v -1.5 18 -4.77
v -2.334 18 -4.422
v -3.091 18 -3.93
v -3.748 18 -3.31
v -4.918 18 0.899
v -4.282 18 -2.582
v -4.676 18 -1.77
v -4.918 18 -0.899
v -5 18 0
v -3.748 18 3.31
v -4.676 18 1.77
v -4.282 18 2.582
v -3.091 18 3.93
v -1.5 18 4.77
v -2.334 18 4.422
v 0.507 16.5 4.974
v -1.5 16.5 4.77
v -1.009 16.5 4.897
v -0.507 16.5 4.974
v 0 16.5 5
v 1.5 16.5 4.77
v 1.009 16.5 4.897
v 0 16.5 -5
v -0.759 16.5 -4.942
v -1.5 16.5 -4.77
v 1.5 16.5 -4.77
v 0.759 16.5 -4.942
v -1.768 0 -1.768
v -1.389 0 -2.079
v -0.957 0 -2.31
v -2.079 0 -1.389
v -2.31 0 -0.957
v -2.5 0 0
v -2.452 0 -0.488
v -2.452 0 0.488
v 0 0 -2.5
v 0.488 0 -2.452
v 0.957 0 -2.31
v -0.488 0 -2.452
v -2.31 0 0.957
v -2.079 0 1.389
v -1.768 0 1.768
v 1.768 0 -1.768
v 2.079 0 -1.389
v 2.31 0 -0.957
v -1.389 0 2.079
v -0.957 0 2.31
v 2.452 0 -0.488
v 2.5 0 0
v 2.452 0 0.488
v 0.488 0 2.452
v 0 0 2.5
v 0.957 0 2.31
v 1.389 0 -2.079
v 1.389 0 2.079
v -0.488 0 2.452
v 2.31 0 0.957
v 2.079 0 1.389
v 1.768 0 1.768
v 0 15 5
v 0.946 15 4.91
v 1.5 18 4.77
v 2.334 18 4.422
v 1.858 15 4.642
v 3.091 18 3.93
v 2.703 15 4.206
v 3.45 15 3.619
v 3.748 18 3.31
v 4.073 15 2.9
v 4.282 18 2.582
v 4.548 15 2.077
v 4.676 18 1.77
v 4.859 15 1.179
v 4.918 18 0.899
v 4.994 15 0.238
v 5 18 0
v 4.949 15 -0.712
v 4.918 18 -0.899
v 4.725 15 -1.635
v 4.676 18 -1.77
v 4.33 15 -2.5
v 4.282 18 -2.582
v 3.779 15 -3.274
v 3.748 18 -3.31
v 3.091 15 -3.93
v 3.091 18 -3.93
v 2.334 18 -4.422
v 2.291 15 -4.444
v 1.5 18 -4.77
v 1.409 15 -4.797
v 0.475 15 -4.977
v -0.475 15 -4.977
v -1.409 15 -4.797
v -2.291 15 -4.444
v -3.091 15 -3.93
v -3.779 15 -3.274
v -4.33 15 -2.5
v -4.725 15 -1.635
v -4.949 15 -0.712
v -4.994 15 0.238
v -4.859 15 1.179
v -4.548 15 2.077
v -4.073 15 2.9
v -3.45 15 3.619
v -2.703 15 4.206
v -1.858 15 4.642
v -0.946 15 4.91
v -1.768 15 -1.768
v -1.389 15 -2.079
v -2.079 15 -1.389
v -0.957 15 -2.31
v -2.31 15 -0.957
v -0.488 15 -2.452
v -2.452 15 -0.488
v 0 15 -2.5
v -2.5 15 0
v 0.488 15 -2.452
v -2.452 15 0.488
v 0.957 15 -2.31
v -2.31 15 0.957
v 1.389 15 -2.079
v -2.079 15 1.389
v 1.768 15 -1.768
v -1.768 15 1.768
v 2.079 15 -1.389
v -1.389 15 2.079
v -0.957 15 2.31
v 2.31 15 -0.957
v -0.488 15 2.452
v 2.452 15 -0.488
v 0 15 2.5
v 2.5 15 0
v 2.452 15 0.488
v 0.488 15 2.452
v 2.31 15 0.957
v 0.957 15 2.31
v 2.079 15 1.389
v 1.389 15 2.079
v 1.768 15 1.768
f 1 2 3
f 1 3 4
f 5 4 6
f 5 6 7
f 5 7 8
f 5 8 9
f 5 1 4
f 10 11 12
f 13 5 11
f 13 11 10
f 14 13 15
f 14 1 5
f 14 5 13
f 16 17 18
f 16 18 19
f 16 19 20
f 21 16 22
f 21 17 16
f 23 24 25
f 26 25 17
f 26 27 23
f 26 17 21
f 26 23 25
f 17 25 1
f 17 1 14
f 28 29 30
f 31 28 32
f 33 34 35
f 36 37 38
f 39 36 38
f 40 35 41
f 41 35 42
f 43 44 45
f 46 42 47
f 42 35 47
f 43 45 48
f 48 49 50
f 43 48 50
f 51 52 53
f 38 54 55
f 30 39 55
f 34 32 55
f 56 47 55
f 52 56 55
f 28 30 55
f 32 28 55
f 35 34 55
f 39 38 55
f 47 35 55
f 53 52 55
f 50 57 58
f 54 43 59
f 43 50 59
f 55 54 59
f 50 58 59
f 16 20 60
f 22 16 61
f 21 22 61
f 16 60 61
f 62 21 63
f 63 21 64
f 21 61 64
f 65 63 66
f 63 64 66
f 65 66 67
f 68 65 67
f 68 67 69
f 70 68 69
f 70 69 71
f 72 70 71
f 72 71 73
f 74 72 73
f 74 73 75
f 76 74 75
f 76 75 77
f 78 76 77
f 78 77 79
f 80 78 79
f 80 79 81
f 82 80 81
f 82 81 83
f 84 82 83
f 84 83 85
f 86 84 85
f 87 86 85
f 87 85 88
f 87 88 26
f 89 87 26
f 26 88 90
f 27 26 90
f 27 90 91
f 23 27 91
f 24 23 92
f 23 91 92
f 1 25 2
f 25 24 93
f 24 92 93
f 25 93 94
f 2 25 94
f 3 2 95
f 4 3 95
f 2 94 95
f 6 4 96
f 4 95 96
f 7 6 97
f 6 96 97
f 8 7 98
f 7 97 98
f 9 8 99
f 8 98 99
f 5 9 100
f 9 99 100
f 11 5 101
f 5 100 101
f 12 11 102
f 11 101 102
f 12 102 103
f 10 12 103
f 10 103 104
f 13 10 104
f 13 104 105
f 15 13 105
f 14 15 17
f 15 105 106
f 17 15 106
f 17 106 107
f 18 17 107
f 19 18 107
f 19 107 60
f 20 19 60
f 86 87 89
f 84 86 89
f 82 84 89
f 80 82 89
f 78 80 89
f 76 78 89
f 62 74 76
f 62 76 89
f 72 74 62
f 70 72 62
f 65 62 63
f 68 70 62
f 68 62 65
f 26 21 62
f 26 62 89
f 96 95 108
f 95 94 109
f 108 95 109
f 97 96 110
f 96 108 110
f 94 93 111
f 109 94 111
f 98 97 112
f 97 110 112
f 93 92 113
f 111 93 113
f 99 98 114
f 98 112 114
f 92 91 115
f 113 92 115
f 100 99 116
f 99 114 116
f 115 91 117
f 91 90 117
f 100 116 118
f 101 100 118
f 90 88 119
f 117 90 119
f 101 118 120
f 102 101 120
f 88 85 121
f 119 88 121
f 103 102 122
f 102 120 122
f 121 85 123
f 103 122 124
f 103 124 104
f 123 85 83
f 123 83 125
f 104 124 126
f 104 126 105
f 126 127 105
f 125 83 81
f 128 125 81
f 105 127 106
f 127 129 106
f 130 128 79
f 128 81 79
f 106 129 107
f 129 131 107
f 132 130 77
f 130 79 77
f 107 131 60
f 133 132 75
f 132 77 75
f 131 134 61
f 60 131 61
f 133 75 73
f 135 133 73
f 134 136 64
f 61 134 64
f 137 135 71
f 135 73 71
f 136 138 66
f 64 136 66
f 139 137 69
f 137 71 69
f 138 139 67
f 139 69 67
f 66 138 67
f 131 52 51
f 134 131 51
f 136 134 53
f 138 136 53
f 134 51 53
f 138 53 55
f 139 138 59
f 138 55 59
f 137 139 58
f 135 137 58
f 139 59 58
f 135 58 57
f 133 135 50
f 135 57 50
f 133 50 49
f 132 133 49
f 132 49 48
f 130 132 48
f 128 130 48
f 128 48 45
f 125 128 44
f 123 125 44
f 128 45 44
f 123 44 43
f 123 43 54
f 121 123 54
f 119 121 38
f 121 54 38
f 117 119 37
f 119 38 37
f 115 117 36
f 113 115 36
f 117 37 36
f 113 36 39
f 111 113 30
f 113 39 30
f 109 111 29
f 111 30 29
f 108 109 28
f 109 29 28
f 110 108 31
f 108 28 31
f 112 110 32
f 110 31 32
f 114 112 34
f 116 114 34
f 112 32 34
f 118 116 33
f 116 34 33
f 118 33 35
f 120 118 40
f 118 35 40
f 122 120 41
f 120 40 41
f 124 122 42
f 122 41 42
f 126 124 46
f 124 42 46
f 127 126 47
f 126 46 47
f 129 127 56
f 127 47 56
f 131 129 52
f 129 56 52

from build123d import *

# Parameters (mm, degrees)
SKETCH1_R           = 2.5
BOSS_EXTRUDE1_DEPTH = 15
SKETCH2_R           = 5
BOSS_EXTRUDE2_DEPTH = 3
CUT_EXTRUDE1_START  = -1.5
CUT_EXTRUDE1_DEPTH  = 1.5


with BuildPart() as part:
    # Sketch1 → Boss-Extrude1 (new body)
    with BuildSketch(Plane(origin=(0, 0, 0), x_dir=(1, 0, 0), z_dir=(0, 1, 0))):
        with Locations(Location((0, 0, 0), (0, 0, 270))):
            Circle(SKETCH1_R)
    extrude(amount=BOSS_EXTRUDE1_DEPTH)

    # Sketch2 → Boss-Extrude2 (add)
    with BuildSketch(Plane(origin=(0, 15, 0), x_dir=(1, 0, 0), z_dir=(0, 1, 0))):
        with Locations(Location((0, 0, 0), (0, 0, 270))):
            Circle(SKETCH2_R)
    extrude(amount=BOSS_EXTRUDE2_DEPTH)

    # Sketch3 → Cut-Extrude1 (cut)
    with BuildSketch(Plane(origin=(0, 18, 0), x_dir=(1, 0, 0), z_dir=(0, 1, 0)).offset(CUT_EXTRUDE1_START)):
        with BuildLine():
            Line((-1.5, 4.769696007), (-1.5, -4.769696007))
            ThreePointArc((-1.5, -4.769696007), (0, -5), (1.5, -4.769696007))
            Line((1.5, -4.769696007), (1.5, 4.769696007))
            ThreePointArc((1.5, 4.769696007), (0, 5), (-1.5, 4.769696007))
        make_face()
    extrude(amount=CUT_EXTRUDE1_DEPTH, mode=Mode.SUBTRACT)


solid = part.part
